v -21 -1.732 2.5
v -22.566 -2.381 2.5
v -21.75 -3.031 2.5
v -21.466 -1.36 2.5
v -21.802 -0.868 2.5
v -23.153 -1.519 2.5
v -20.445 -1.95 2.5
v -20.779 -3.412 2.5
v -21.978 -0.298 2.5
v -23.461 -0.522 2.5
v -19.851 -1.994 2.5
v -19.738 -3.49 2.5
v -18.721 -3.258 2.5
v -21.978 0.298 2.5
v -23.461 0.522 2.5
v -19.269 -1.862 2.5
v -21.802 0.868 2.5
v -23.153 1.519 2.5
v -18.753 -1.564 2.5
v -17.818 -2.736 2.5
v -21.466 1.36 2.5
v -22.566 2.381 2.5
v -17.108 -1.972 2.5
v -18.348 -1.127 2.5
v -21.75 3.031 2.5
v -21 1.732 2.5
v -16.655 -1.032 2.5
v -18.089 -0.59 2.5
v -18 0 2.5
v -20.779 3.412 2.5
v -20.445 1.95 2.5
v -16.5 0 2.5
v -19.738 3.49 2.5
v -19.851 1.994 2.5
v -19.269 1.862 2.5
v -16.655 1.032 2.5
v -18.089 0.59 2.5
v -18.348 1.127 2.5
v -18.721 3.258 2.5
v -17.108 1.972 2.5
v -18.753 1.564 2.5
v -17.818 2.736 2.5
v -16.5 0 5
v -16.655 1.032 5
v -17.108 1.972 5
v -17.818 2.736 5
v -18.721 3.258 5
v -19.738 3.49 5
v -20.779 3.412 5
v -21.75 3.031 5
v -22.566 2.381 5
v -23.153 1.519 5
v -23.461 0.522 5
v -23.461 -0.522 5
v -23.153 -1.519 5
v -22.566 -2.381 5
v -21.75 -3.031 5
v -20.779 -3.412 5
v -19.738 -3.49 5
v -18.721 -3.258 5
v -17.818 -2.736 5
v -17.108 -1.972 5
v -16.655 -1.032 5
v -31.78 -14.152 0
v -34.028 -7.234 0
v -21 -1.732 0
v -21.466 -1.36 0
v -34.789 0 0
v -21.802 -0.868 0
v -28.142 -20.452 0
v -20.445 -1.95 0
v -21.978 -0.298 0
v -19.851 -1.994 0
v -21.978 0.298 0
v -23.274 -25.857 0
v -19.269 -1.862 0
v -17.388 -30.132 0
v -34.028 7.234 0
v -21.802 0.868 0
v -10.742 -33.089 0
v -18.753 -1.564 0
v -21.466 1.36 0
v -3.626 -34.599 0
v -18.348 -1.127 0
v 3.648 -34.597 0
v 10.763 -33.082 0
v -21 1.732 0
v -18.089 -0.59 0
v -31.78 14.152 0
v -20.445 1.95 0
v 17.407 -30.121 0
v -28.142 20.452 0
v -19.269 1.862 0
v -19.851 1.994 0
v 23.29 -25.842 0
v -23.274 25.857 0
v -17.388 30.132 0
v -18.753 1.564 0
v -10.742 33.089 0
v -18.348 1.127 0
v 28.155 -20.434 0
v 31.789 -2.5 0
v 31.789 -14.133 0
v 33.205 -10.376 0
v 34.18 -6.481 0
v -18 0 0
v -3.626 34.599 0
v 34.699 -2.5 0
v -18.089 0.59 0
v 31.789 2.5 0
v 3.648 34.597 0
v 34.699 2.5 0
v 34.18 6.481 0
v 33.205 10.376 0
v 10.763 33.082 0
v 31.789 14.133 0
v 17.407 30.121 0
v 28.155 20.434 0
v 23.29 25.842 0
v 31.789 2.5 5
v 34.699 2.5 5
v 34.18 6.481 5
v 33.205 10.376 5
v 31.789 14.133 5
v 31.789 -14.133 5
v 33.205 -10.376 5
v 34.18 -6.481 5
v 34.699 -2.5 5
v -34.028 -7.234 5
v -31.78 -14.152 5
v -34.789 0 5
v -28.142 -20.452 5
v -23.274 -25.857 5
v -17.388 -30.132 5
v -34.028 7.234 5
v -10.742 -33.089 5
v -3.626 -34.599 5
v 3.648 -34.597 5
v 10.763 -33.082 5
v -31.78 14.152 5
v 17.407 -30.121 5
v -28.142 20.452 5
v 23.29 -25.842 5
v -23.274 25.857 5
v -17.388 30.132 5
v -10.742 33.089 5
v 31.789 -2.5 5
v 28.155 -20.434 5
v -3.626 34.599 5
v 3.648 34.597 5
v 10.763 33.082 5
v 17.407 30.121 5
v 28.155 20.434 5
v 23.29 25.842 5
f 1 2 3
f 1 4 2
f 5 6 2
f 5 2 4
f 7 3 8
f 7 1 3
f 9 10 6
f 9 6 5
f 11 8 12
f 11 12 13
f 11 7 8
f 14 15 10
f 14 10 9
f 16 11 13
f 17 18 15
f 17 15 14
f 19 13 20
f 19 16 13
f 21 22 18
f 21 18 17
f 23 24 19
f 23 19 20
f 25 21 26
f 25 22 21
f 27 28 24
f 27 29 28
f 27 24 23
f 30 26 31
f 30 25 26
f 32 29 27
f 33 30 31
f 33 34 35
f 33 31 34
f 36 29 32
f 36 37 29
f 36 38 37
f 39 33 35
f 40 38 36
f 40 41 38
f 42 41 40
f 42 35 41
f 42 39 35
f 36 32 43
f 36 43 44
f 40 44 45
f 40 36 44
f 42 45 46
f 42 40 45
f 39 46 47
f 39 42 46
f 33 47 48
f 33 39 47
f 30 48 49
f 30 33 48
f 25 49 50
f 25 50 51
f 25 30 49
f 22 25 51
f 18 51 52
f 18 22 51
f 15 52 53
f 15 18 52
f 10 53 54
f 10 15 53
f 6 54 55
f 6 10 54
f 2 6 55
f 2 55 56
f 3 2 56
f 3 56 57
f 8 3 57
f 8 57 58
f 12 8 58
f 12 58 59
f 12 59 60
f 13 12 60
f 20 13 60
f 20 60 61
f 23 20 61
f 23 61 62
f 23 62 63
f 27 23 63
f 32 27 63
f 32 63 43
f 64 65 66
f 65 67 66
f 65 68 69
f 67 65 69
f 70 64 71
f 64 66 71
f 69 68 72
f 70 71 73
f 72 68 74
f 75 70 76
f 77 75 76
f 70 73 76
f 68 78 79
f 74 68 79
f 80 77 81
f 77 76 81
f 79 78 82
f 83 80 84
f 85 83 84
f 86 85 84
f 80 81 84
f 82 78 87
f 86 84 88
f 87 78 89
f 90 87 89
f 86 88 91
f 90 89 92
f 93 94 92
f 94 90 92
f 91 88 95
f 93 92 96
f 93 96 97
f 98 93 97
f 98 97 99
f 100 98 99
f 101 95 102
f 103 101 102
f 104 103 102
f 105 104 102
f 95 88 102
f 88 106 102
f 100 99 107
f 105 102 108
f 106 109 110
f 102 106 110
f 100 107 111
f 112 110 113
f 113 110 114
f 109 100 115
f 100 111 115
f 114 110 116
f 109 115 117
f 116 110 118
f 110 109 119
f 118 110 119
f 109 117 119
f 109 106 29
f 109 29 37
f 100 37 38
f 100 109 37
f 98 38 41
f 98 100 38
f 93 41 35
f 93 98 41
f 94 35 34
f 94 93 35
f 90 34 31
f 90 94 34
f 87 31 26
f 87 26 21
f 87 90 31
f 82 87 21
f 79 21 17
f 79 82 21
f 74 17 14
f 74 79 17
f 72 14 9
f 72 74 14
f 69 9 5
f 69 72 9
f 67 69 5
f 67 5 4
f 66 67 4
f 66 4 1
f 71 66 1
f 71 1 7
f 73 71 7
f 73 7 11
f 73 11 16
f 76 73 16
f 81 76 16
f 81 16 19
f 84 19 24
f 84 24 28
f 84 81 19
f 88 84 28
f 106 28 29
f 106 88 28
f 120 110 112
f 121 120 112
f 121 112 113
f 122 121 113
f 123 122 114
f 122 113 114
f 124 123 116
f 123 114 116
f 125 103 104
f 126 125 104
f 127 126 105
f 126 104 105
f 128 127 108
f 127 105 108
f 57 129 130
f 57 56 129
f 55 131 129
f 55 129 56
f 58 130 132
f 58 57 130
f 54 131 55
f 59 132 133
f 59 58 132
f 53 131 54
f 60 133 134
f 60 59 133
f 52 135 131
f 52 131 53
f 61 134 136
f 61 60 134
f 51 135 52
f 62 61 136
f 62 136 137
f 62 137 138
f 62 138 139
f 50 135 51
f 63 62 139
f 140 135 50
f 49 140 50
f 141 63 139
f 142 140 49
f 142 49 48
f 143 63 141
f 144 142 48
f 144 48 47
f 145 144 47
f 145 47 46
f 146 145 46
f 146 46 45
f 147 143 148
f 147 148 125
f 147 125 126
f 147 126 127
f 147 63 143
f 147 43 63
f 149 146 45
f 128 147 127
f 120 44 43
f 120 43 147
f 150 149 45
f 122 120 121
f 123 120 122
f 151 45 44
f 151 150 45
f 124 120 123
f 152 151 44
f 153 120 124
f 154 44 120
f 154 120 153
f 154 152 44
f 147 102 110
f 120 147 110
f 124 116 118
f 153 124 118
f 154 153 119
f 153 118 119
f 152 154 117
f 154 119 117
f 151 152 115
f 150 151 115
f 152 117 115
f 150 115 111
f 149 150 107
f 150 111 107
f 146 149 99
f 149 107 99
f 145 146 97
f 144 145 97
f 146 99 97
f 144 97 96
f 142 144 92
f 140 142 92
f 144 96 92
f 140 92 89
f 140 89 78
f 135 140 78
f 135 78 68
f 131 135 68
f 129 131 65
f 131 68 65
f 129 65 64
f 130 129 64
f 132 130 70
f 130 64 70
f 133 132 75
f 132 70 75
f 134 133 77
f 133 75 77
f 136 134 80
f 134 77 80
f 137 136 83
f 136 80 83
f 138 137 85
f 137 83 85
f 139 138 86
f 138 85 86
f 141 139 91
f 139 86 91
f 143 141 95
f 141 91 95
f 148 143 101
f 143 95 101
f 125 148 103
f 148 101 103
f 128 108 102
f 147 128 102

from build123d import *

# Parameters (mm, degrees)
F0_R     = 3.5
F1_DEPTH = 5
F0_R_2   = 2
F2_DEPTH = 2.5


with BuildPart() as f1:
    # F0 (on Top) → F1 (new body)
    with BuildSketch(Plane.XY):
        with BuildLine():
            Line((31.788736, 2.5), (31.788736, 14.132672))
            ThreePointArc((31.788736, 14.132672), (-34.788736, 0), (31.788736, -14.132672))
            Line((31.788736, -14.132672), (31.788736, -2.5))
            Line((31.788736, -2.5), (31.788736, 2.5))
        make_face()
        with Locations((-20, 0)):
            Circle(F0_R, mode=Mode.SUBTRACT)
        with BuildLine():
            Line((31.788736, 2.5), (34.698792, 2.5))
            ThreePointArc((34.698792, 2.5), (33.748742, 8.442662), (31.788736, 14.132672))
            Line((31.788736, 14.132672), (31.788736, 2.5))
        make_face()
        with BuildLine():
            ThreePointArc((31.788736, -14.132672), (33.748742, -8.442662), (34.698792, -2.5))
            Line((34.698792, -2.5), (31.788736, -2.5))
            Line((31.788736, -2.5), (31.788736, -14.132672))
        make_face()
    extrude(amount=F1_DEPTH)

    # F0 (on Top) → F2 (join)
    with BuildSketch(Plane.XY):
        with Locations((-20, 0)):
            Circle(F0_R)
        with Locations((-20, 0)):
            Circle(F0_R_2, mode=Mode.SUBTRACT)
    extrude(amount=F2_DEPTH)


solid = f1.part
